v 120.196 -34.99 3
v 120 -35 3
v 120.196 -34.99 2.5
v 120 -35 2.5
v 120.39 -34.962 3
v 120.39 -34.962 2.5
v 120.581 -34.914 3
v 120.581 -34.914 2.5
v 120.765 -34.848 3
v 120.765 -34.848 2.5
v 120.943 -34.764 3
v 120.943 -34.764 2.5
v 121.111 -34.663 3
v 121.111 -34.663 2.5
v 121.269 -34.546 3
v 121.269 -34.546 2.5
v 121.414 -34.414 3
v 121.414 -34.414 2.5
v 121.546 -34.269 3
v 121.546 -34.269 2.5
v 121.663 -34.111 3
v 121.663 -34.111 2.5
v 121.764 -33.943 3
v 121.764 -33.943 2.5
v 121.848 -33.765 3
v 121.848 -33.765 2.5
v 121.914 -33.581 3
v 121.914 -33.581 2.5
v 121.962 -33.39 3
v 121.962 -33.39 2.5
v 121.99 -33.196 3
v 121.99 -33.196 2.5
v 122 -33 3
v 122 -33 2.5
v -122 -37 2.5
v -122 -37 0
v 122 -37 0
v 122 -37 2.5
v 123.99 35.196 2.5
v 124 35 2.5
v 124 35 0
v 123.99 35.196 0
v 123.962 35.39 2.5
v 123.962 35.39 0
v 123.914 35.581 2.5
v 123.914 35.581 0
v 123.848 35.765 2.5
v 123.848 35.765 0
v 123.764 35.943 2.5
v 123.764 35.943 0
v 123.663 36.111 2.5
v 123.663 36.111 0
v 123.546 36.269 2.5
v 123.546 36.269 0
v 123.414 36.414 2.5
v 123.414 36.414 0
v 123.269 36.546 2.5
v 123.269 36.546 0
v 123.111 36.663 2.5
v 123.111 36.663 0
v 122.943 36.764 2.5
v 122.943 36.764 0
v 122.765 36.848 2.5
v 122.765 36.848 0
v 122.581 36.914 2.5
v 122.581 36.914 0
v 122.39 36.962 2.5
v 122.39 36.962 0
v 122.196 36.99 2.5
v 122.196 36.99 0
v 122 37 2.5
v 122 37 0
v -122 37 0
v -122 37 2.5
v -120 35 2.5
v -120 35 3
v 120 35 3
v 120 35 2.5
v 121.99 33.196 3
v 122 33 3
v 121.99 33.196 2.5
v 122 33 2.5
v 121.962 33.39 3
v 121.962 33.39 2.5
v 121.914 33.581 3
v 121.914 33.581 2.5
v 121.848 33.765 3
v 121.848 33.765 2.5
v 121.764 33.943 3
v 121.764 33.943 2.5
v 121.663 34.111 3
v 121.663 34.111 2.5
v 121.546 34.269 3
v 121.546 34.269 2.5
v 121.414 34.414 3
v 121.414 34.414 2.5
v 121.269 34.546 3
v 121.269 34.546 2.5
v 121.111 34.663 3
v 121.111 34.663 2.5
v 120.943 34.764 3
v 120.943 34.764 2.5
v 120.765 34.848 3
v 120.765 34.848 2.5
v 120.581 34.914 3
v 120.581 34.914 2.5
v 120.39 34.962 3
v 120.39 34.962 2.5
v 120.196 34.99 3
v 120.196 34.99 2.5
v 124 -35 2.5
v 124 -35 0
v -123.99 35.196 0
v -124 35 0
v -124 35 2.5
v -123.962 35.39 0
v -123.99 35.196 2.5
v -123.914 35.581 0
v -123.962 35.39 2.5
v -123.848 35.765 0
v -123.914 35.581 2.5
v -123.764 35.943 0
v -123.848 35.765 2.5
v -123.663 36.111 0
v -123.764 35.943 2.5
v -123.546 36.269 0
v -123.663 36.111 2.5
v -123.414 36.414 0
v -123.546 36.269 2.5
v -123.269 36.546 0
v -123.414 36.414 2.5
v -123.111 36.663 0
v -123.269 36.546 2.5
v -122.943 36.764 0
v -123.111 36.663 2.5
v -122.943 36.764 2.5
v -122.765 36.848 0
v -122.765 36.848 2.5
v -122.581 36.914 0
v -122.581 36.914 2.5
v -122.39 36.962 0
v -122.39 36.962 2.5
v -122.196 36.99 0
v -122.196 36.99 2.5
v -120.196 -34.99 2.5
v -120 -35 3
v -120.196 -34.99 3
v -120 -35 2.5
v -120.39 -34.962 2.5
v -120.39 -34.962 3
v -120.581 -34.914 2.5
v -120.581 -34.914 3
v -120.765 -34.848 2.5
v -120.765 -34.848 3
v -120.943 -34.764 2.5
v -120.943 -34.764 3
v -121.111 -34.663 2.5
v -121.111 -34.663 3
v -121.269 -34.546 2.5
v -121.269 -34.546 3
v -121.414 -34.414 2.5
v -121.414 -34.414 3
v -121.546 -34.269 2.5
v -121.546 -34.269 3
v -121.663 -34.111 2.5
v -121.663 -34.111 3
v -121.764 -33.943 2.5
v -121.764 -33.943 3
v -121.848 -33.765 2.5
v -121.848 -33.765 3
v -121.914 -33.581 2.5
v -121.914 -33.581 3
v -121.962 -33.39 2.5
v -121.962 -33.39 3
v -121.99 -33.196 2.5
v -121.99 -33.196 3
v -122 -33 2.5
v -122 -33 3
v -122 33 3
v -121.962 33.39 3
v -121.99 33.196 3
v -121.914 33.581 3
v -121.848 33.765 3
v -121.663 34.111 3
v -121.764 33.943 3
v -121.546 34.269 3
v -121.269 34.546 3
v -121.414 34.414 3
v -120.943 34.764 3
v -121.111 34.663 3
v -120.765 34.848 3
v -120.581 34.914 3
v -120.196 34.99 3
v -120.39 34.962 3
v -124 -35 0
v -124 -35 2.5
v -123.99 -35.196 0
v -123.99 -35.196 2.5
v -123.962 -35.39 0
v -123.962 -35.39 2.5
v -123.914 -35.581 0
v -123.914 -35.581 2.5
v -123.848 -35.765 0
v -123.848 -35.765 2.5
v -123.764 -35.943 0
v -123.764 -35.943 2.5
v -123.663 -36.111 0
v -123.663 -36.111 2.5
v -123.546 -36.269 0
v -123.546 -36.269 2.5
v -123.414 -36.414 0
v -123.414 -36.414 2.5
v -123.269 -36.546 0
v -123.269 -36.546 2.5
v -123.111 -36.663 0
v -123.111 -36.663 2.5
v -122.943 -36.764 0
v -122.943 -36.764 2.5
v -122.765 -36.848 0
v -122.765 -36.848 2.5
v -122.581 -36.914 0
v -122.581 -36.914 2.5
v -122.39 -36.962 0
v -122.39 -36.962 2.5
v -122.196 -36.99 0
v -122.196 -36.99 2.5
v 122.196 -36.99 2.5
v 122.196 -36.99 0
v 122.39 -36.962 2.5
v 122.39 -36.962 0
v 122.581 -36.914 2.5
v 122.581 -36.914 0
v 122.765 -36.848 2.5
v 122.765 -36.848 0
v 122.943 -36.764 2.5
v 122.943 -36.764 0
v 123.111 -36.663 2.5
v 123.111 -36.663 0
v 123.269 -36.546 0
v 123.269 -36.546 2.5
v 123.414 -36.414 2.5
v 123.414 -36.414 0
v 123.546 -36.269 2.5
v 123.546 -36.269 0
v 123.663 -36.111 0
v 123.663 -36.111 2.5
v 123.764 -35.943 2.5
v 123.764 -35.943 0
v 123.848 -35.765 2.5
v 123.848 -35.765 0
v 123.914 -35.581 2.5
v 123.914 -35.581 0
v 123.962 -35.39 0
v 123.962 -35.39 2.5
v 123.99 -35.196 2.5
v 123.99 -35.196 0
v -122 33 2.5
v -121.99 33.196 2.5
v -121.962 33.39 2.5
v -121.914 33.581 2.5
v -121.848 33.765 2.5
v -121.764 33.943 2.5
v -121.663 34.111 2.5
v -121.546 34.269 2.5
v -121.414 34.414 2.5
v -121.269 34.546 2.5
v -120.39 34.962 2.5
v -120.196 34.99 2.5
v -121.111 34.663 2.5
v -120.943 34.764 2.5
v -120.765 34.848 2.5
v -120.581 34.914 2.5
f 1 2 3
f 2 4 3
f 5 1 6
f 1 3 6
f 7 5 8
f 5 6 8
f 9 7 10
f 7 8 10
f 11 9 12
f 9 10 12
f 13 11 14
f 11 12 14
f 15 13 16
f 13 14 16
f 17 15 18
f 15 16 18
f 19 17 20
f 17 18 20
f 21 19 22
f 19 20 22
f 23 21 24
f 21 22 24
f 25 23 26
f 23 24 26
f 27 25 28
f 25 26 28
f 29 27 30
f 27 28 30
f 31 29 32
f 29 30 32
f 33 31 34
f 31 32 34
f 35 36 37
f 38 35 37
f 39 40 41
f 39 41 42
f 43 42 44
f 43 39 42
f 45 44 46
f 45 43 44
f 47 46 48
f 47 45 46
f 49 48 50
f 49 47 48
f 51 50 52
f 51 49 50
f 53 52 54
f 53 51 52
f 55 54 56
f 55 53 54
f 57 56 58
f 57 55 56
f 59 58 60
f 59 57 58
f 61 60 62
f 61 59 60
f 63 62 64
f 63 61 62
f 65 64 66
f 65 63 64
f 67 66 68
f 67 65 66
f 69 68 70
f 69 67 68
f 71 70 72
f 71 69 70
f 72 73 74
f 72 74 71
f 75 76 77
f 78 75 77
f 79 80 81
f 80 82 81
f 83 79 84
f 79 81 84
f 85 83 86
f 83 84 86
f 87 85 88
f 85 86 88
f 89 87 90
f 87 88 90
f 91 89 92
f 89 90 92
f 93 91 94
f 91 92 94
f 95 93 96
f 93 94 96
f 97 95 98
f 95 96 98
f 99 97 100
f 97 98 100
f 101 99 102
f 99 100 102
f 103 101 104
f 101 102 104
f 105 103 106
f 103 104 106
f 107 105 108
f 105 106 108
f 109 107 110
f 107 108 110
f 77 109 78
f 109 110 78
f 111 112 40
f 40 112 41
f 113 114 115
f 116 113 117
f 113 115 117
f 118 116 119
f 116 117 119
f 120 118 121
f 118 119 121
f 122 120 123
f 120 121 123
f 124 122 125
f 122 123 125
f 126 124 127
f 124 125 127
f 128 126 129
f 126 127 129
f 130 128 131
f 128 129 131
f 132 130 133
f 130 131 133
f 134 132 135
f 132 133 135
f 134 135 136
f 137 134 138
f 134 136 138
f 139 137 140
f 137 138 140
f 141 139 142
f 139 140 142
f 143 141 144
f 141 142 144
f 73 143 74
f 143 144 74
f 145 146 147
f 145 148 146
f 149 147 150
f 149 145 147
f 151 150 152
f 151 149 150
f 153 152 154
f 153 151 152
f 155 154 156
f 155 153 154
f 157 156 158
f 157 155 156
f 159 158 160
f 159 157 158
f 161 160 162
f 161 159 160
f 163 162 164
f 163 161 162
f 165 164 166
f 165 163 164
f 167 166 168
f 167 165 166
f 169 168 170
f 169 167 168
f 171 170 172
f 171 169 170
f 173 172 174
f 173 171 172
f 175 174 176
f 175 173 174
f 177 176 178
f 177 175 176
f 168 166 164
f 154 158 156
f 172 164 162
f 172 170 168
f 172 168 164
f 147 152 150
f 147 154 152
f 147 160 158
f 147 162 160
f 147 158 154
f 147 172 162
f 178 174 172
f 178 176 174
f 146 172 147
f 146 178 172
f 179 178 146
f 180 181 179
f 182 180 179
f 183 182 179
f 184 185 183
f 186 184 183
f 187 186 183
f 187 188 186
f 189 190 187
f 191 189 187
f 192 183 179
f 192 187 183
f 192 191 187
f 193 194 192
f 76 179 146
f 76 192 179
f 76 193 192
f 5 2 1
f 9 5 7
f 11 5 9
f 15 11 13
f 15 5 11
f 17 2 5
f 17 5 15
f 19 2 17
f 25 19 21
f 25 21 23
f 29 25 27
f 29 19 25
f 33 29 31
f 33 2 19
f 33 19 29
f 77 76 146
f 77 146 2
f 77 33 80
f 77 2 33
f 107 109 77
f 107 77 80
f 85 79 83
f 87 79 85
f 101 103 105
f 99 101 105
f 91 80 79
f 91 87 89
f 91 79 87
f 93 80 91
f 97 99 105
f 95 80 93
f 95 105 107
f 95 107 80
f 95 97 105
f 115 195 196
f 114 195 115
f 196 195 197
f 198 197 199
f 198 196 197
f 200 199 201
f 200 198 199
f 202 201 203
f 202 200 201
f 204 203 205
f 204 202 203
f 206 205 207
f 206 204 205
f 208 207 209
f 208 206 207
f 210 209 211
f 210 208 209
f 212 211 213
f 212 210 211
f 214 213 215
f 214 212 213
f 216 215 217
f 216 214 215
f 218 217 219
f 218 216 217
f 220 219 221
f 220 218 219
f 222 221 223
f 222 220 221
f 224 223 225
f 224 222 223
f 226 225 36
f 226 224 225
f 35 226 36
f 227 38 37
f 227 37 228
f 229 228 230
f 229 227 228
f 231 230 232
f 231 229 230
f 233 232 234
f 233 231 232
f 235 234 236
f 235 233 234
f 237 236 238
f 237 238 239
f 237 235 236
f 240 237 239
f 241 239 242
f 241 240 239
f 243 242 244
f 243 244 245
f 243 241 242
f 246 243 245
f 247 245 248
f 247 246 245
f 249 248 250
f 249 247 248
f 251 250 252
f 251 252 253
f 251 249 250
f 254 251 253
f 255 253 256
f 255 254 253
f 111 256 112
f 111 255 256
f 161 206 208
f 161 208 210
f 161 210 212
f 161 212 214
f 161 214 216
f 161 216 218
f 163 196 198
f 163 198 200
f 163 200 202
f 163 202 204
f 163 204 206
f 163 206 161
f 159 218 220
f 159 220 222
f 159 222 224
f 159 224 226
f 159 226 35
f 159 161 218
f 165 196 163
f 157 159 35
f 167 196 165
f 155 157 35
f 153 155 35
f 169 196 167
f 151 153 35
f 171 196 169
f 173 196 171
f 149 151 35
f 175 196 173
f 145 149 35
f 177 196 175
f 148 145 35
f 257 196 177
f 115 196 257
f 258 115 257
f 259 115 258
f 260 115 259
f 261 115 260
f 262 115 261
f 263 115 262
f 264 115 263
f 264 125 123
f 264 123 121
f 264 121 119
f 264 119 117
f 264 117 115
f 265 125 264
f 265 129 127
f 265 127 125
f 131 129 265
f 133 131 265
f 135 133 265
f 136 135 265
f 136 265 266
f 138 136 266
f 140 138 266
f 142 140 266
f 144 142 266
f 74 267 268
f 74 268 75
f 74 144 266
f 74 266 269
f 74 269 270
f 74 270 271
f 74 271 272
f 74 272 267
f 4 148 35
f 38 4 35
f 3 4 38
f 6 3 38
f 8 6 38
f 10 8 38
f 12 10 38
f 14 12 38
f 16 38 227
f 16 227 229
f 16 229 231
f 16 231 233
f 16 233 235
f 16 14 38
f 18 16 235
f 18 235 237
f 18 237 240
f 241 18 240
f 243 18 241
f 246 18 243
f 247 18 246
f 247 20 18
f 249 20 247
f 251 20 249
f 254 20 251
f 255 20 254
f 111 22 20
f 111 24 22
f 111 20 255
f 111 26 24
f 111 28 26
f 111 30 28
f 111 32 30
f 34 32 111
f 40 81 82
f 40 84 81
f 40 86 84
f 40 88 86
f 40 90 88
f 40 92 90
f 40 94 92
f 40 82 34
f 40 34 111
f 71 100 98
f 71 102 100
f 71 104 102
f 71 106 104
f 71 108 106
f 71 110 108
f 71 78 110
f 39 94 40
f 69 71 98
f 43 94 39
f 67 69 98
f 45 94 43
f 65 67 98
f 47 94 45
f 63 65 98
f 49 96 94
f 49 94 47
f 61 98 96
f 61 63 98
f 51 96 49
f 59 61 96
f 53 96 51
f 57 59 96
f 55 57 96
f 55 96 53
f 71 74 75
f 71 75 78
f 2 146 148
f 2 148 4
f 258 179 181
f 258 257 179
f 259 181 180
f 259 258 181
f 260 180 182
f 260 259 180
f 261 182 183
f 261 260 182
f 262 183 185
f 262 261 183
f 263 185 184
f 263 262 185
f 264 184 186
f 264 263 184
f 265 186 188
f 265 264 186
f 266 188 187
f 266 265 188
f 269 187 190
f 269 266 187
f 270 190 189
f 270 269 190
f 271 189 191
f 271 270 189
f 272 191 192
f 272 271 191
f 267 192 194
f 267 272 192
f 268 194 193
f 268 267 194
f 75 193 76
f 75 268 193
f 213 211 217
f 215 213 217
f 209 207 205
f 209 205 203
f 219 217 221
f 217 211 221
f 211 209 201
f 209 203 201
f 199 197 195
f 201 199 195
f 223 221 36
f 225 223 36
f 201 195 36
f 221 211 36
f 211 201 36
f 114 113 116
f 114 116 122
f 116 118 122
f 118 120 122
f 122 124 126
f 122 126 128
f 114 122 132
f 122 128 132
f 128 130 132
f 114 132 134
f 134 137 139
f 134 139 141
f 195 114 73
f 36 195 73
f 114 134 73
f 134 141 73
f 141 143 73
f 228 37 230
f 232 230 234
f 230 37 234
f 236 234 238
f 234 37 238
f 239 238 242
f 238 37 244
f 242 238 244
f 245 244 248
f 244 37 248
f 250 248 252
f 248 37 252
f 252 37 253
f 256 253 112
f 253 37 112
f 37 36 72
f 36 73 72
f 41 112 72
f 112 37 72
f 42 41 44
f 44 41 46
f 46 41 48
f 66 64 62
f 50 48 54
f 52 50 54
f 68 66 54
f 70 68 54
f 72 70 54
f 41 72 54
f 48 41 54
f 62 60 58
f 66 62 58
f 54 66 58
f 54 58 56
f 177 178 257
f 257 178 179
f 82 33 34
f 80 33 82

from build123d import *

# Parameters (mm, degrees)
SKETCH_W      = 248
SKETCH_H      = 74
PAD_DEPTH     = 3
FILLET_R      = 2
SKETCH001_W   = 248
SKETCH001_H   = 74
SKETCH001_W_2 = 244
SKETCH001_H_2 = 70
POCKET_DEPTH  = 0.5
FILLET001_R   = 2


with BuildPart() as part:
    # Sketch → Pad (new body)
    with BuildSketch(Plane.XY):
        Rectangle(SKETCH_W, SKETCH_H)
    extrude(amount=PAD_DEPTH)

    # Fillet
    fillet_edges = [part.edges().sort_by_distance(p)[0] for p in [
        (124, -37, 1.5),
        (124, 37, 1.5),
        (-124, 37, 1.5),
        (-124, -37, 1.5),
    ]]
    fillet(fillet_edges, radius=FILLET_R)

    # Sketch001 (on Face5 of Fillet) → Pocket (cut)
    with BuildSketch(Plane.XY.offset(3)):
        Rectangle(SKETCH001_W, SKETCH001_H)
        Rectangle(SKETCH001_W_2, SKETCH001_H_2, mode=Mode.SUBTRACT)
    extrude(amount=-POCKET_DEPTH, mode=Mode.SUBTRACT)

    # Fillet001
    fillet001_edges = [part.edges().sort_by_distance(p)[0] for p in [
        (122, -35, 2.75),
        (122, 35, 2.75),
        (-122, -35, 2.75),
        (-122, 35, 2.75),
    ]]
    fillet(fillet001_edges, radius=FILLET001_R)


solid = part.part
